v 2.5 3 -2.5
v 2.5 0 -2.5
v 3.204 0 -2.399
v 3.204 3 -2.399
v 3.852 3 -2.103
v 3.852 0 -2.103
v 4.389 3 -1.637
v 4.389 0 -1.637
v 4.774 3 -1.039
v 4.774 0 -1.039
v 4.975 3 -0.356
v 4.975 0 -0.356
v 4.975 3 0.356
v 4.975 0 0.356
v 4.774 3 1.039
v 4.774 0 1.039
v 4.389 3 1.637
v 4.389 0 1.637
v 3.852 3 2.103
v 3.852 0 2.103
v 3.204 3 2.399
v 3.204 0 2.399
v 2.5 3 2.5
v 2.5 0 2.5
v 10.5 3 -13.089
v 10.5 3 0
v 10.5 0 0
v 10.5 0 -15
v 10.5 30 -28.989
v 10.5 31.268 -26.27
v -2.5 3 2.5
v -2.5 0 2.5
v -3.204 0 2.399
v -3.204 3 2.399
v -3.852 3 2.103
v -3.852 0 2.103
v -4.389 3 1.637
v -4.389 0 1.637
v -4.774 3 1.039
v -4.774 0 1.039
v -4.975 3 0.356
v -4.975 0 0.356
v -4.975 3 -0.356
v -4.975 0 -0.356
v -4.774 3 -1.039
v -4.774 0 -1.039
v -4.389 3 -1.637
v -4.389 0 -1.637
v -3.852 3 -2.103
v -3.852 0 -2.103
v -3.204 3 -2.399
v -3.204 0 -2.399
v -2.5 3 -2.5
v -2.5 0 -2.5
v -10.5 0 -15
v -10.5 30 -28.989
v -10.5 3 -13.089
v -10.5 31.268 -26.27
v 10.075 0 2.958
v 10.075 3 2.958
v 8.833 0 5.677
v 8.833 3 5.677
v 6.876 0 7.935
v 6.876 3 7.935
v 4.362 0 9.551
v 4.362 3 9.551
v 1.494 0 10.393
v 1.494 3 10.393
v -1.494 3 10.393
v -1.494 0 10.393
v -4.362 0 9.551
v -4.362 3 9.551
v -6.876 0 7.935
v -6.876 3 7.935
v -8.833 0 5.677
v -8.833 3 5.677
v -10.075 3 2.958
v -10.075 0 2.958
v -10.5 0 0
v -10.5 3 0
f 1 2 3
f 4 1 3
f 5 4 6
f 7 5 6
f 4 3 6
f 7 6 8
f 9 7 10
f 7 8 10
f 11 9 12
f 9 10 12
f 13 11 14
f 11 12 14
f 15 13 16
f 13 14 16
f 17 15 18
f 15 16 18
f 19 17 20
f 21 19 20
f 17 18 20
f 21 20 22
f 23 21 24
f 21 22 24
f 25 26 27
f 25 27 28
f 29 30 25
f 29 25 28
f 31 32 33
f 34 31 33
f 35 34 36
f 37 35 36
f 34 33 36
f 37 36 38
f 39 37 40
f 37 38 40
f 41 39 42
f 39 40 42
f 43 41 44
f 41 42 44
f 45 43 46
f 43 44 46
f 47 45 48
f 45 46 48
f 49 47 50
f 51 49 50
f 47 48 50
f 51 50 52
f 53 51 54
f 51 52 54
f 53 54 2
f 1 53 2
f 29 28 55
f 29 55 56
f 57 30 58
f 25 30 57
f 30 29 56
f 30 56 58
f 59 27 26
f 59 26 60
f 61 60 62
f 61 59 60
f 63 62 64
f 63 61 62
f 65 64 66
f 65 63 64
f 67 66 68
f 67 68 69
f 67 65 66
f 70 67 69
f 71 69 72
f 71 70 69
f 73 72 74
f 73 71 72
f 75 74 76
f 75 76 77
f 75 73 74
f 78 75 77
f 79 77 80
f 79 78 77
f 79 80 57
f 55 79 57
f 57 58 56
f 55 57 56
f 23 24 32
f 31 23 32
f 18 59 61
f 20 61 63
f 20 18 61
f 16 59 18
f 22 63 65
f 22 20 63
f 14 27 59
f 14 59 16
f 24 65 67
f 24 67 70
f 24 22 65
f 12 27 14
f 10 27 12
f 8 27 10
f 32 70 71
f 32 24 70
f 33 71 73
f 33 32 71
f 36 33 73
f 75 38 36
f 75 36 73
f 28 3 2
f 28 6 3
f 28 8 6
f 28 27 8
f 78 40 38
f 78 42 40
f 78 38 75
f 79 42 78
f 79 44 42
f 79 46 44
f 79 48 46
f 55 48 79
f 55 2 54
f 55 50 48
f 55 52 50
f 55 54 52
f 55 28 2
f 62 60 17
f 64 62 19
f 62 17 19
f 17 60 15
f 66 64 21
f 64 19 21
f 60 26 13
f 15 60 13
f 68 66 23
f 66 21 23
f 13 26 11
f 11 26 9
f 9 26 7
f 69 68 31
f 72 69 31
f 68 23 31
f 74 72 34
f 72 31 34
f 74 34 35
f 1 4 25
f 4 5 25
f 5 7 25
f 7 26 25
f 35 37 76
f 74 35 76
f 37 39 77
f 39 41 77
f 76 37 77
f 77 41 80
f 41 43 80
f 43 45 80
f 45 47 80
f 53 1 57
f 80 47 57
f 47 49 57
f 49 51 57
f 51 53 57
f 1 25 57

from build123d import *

# Parameters (mm, degrees)
BOSS_EXTRUDE1_DEPTH = 3
BOSS_EXTRUDE3_DEPTH = 21


with BuildPart() as part:
    # Sketch1 → Boss-Extrude1 (new body)
    with BuildSketch(Plane(origin=(0, 0, 0), x_dir=(1, 0, 0), z_dir=(0, 1, 0))):
        with BuildLine():
            Line((-10.5, 0), (-10.5, 15))
            Line((-10.5, 15), (10.5, 15))
            Line((10.5, 15), (10.5, 0))
            ThreePointArc((10.5, 0), (0, -10.5), (-10.5, 0))
        make_face()
        with BuildLine():
            Line((-2.5, 2.5), (2.5, 2.5))
            ThreePointArc((2.5, 2.5), (5, 0), (2.5, -2.5))
            Line((2.5, -2.5), (-2.5, -2.5))
            ThreePointArc((-2.5, -2.5), (-5, 0), (-2.5, 2.5))
        make_face(mode=Mode.SUBTRACT)
    extrude(amount=BOSS_EXTRUDE1_DEPTH)

    # Sketch3 → Boss-Extrude3 (add)
    with BuildSketch(Plane(origin=(10.5, 0, 0), x_dir=(0, 0, -1), z_dir=(1, 0, 0))):
        Polygon((15, 0), (28.989229745, 30), (26.270306384, 31.267854785), (11.689866243, 0), align=None)
    extrude(amount=-BOSS_EXTRUDE3_DEPTH)


solid = part.part
